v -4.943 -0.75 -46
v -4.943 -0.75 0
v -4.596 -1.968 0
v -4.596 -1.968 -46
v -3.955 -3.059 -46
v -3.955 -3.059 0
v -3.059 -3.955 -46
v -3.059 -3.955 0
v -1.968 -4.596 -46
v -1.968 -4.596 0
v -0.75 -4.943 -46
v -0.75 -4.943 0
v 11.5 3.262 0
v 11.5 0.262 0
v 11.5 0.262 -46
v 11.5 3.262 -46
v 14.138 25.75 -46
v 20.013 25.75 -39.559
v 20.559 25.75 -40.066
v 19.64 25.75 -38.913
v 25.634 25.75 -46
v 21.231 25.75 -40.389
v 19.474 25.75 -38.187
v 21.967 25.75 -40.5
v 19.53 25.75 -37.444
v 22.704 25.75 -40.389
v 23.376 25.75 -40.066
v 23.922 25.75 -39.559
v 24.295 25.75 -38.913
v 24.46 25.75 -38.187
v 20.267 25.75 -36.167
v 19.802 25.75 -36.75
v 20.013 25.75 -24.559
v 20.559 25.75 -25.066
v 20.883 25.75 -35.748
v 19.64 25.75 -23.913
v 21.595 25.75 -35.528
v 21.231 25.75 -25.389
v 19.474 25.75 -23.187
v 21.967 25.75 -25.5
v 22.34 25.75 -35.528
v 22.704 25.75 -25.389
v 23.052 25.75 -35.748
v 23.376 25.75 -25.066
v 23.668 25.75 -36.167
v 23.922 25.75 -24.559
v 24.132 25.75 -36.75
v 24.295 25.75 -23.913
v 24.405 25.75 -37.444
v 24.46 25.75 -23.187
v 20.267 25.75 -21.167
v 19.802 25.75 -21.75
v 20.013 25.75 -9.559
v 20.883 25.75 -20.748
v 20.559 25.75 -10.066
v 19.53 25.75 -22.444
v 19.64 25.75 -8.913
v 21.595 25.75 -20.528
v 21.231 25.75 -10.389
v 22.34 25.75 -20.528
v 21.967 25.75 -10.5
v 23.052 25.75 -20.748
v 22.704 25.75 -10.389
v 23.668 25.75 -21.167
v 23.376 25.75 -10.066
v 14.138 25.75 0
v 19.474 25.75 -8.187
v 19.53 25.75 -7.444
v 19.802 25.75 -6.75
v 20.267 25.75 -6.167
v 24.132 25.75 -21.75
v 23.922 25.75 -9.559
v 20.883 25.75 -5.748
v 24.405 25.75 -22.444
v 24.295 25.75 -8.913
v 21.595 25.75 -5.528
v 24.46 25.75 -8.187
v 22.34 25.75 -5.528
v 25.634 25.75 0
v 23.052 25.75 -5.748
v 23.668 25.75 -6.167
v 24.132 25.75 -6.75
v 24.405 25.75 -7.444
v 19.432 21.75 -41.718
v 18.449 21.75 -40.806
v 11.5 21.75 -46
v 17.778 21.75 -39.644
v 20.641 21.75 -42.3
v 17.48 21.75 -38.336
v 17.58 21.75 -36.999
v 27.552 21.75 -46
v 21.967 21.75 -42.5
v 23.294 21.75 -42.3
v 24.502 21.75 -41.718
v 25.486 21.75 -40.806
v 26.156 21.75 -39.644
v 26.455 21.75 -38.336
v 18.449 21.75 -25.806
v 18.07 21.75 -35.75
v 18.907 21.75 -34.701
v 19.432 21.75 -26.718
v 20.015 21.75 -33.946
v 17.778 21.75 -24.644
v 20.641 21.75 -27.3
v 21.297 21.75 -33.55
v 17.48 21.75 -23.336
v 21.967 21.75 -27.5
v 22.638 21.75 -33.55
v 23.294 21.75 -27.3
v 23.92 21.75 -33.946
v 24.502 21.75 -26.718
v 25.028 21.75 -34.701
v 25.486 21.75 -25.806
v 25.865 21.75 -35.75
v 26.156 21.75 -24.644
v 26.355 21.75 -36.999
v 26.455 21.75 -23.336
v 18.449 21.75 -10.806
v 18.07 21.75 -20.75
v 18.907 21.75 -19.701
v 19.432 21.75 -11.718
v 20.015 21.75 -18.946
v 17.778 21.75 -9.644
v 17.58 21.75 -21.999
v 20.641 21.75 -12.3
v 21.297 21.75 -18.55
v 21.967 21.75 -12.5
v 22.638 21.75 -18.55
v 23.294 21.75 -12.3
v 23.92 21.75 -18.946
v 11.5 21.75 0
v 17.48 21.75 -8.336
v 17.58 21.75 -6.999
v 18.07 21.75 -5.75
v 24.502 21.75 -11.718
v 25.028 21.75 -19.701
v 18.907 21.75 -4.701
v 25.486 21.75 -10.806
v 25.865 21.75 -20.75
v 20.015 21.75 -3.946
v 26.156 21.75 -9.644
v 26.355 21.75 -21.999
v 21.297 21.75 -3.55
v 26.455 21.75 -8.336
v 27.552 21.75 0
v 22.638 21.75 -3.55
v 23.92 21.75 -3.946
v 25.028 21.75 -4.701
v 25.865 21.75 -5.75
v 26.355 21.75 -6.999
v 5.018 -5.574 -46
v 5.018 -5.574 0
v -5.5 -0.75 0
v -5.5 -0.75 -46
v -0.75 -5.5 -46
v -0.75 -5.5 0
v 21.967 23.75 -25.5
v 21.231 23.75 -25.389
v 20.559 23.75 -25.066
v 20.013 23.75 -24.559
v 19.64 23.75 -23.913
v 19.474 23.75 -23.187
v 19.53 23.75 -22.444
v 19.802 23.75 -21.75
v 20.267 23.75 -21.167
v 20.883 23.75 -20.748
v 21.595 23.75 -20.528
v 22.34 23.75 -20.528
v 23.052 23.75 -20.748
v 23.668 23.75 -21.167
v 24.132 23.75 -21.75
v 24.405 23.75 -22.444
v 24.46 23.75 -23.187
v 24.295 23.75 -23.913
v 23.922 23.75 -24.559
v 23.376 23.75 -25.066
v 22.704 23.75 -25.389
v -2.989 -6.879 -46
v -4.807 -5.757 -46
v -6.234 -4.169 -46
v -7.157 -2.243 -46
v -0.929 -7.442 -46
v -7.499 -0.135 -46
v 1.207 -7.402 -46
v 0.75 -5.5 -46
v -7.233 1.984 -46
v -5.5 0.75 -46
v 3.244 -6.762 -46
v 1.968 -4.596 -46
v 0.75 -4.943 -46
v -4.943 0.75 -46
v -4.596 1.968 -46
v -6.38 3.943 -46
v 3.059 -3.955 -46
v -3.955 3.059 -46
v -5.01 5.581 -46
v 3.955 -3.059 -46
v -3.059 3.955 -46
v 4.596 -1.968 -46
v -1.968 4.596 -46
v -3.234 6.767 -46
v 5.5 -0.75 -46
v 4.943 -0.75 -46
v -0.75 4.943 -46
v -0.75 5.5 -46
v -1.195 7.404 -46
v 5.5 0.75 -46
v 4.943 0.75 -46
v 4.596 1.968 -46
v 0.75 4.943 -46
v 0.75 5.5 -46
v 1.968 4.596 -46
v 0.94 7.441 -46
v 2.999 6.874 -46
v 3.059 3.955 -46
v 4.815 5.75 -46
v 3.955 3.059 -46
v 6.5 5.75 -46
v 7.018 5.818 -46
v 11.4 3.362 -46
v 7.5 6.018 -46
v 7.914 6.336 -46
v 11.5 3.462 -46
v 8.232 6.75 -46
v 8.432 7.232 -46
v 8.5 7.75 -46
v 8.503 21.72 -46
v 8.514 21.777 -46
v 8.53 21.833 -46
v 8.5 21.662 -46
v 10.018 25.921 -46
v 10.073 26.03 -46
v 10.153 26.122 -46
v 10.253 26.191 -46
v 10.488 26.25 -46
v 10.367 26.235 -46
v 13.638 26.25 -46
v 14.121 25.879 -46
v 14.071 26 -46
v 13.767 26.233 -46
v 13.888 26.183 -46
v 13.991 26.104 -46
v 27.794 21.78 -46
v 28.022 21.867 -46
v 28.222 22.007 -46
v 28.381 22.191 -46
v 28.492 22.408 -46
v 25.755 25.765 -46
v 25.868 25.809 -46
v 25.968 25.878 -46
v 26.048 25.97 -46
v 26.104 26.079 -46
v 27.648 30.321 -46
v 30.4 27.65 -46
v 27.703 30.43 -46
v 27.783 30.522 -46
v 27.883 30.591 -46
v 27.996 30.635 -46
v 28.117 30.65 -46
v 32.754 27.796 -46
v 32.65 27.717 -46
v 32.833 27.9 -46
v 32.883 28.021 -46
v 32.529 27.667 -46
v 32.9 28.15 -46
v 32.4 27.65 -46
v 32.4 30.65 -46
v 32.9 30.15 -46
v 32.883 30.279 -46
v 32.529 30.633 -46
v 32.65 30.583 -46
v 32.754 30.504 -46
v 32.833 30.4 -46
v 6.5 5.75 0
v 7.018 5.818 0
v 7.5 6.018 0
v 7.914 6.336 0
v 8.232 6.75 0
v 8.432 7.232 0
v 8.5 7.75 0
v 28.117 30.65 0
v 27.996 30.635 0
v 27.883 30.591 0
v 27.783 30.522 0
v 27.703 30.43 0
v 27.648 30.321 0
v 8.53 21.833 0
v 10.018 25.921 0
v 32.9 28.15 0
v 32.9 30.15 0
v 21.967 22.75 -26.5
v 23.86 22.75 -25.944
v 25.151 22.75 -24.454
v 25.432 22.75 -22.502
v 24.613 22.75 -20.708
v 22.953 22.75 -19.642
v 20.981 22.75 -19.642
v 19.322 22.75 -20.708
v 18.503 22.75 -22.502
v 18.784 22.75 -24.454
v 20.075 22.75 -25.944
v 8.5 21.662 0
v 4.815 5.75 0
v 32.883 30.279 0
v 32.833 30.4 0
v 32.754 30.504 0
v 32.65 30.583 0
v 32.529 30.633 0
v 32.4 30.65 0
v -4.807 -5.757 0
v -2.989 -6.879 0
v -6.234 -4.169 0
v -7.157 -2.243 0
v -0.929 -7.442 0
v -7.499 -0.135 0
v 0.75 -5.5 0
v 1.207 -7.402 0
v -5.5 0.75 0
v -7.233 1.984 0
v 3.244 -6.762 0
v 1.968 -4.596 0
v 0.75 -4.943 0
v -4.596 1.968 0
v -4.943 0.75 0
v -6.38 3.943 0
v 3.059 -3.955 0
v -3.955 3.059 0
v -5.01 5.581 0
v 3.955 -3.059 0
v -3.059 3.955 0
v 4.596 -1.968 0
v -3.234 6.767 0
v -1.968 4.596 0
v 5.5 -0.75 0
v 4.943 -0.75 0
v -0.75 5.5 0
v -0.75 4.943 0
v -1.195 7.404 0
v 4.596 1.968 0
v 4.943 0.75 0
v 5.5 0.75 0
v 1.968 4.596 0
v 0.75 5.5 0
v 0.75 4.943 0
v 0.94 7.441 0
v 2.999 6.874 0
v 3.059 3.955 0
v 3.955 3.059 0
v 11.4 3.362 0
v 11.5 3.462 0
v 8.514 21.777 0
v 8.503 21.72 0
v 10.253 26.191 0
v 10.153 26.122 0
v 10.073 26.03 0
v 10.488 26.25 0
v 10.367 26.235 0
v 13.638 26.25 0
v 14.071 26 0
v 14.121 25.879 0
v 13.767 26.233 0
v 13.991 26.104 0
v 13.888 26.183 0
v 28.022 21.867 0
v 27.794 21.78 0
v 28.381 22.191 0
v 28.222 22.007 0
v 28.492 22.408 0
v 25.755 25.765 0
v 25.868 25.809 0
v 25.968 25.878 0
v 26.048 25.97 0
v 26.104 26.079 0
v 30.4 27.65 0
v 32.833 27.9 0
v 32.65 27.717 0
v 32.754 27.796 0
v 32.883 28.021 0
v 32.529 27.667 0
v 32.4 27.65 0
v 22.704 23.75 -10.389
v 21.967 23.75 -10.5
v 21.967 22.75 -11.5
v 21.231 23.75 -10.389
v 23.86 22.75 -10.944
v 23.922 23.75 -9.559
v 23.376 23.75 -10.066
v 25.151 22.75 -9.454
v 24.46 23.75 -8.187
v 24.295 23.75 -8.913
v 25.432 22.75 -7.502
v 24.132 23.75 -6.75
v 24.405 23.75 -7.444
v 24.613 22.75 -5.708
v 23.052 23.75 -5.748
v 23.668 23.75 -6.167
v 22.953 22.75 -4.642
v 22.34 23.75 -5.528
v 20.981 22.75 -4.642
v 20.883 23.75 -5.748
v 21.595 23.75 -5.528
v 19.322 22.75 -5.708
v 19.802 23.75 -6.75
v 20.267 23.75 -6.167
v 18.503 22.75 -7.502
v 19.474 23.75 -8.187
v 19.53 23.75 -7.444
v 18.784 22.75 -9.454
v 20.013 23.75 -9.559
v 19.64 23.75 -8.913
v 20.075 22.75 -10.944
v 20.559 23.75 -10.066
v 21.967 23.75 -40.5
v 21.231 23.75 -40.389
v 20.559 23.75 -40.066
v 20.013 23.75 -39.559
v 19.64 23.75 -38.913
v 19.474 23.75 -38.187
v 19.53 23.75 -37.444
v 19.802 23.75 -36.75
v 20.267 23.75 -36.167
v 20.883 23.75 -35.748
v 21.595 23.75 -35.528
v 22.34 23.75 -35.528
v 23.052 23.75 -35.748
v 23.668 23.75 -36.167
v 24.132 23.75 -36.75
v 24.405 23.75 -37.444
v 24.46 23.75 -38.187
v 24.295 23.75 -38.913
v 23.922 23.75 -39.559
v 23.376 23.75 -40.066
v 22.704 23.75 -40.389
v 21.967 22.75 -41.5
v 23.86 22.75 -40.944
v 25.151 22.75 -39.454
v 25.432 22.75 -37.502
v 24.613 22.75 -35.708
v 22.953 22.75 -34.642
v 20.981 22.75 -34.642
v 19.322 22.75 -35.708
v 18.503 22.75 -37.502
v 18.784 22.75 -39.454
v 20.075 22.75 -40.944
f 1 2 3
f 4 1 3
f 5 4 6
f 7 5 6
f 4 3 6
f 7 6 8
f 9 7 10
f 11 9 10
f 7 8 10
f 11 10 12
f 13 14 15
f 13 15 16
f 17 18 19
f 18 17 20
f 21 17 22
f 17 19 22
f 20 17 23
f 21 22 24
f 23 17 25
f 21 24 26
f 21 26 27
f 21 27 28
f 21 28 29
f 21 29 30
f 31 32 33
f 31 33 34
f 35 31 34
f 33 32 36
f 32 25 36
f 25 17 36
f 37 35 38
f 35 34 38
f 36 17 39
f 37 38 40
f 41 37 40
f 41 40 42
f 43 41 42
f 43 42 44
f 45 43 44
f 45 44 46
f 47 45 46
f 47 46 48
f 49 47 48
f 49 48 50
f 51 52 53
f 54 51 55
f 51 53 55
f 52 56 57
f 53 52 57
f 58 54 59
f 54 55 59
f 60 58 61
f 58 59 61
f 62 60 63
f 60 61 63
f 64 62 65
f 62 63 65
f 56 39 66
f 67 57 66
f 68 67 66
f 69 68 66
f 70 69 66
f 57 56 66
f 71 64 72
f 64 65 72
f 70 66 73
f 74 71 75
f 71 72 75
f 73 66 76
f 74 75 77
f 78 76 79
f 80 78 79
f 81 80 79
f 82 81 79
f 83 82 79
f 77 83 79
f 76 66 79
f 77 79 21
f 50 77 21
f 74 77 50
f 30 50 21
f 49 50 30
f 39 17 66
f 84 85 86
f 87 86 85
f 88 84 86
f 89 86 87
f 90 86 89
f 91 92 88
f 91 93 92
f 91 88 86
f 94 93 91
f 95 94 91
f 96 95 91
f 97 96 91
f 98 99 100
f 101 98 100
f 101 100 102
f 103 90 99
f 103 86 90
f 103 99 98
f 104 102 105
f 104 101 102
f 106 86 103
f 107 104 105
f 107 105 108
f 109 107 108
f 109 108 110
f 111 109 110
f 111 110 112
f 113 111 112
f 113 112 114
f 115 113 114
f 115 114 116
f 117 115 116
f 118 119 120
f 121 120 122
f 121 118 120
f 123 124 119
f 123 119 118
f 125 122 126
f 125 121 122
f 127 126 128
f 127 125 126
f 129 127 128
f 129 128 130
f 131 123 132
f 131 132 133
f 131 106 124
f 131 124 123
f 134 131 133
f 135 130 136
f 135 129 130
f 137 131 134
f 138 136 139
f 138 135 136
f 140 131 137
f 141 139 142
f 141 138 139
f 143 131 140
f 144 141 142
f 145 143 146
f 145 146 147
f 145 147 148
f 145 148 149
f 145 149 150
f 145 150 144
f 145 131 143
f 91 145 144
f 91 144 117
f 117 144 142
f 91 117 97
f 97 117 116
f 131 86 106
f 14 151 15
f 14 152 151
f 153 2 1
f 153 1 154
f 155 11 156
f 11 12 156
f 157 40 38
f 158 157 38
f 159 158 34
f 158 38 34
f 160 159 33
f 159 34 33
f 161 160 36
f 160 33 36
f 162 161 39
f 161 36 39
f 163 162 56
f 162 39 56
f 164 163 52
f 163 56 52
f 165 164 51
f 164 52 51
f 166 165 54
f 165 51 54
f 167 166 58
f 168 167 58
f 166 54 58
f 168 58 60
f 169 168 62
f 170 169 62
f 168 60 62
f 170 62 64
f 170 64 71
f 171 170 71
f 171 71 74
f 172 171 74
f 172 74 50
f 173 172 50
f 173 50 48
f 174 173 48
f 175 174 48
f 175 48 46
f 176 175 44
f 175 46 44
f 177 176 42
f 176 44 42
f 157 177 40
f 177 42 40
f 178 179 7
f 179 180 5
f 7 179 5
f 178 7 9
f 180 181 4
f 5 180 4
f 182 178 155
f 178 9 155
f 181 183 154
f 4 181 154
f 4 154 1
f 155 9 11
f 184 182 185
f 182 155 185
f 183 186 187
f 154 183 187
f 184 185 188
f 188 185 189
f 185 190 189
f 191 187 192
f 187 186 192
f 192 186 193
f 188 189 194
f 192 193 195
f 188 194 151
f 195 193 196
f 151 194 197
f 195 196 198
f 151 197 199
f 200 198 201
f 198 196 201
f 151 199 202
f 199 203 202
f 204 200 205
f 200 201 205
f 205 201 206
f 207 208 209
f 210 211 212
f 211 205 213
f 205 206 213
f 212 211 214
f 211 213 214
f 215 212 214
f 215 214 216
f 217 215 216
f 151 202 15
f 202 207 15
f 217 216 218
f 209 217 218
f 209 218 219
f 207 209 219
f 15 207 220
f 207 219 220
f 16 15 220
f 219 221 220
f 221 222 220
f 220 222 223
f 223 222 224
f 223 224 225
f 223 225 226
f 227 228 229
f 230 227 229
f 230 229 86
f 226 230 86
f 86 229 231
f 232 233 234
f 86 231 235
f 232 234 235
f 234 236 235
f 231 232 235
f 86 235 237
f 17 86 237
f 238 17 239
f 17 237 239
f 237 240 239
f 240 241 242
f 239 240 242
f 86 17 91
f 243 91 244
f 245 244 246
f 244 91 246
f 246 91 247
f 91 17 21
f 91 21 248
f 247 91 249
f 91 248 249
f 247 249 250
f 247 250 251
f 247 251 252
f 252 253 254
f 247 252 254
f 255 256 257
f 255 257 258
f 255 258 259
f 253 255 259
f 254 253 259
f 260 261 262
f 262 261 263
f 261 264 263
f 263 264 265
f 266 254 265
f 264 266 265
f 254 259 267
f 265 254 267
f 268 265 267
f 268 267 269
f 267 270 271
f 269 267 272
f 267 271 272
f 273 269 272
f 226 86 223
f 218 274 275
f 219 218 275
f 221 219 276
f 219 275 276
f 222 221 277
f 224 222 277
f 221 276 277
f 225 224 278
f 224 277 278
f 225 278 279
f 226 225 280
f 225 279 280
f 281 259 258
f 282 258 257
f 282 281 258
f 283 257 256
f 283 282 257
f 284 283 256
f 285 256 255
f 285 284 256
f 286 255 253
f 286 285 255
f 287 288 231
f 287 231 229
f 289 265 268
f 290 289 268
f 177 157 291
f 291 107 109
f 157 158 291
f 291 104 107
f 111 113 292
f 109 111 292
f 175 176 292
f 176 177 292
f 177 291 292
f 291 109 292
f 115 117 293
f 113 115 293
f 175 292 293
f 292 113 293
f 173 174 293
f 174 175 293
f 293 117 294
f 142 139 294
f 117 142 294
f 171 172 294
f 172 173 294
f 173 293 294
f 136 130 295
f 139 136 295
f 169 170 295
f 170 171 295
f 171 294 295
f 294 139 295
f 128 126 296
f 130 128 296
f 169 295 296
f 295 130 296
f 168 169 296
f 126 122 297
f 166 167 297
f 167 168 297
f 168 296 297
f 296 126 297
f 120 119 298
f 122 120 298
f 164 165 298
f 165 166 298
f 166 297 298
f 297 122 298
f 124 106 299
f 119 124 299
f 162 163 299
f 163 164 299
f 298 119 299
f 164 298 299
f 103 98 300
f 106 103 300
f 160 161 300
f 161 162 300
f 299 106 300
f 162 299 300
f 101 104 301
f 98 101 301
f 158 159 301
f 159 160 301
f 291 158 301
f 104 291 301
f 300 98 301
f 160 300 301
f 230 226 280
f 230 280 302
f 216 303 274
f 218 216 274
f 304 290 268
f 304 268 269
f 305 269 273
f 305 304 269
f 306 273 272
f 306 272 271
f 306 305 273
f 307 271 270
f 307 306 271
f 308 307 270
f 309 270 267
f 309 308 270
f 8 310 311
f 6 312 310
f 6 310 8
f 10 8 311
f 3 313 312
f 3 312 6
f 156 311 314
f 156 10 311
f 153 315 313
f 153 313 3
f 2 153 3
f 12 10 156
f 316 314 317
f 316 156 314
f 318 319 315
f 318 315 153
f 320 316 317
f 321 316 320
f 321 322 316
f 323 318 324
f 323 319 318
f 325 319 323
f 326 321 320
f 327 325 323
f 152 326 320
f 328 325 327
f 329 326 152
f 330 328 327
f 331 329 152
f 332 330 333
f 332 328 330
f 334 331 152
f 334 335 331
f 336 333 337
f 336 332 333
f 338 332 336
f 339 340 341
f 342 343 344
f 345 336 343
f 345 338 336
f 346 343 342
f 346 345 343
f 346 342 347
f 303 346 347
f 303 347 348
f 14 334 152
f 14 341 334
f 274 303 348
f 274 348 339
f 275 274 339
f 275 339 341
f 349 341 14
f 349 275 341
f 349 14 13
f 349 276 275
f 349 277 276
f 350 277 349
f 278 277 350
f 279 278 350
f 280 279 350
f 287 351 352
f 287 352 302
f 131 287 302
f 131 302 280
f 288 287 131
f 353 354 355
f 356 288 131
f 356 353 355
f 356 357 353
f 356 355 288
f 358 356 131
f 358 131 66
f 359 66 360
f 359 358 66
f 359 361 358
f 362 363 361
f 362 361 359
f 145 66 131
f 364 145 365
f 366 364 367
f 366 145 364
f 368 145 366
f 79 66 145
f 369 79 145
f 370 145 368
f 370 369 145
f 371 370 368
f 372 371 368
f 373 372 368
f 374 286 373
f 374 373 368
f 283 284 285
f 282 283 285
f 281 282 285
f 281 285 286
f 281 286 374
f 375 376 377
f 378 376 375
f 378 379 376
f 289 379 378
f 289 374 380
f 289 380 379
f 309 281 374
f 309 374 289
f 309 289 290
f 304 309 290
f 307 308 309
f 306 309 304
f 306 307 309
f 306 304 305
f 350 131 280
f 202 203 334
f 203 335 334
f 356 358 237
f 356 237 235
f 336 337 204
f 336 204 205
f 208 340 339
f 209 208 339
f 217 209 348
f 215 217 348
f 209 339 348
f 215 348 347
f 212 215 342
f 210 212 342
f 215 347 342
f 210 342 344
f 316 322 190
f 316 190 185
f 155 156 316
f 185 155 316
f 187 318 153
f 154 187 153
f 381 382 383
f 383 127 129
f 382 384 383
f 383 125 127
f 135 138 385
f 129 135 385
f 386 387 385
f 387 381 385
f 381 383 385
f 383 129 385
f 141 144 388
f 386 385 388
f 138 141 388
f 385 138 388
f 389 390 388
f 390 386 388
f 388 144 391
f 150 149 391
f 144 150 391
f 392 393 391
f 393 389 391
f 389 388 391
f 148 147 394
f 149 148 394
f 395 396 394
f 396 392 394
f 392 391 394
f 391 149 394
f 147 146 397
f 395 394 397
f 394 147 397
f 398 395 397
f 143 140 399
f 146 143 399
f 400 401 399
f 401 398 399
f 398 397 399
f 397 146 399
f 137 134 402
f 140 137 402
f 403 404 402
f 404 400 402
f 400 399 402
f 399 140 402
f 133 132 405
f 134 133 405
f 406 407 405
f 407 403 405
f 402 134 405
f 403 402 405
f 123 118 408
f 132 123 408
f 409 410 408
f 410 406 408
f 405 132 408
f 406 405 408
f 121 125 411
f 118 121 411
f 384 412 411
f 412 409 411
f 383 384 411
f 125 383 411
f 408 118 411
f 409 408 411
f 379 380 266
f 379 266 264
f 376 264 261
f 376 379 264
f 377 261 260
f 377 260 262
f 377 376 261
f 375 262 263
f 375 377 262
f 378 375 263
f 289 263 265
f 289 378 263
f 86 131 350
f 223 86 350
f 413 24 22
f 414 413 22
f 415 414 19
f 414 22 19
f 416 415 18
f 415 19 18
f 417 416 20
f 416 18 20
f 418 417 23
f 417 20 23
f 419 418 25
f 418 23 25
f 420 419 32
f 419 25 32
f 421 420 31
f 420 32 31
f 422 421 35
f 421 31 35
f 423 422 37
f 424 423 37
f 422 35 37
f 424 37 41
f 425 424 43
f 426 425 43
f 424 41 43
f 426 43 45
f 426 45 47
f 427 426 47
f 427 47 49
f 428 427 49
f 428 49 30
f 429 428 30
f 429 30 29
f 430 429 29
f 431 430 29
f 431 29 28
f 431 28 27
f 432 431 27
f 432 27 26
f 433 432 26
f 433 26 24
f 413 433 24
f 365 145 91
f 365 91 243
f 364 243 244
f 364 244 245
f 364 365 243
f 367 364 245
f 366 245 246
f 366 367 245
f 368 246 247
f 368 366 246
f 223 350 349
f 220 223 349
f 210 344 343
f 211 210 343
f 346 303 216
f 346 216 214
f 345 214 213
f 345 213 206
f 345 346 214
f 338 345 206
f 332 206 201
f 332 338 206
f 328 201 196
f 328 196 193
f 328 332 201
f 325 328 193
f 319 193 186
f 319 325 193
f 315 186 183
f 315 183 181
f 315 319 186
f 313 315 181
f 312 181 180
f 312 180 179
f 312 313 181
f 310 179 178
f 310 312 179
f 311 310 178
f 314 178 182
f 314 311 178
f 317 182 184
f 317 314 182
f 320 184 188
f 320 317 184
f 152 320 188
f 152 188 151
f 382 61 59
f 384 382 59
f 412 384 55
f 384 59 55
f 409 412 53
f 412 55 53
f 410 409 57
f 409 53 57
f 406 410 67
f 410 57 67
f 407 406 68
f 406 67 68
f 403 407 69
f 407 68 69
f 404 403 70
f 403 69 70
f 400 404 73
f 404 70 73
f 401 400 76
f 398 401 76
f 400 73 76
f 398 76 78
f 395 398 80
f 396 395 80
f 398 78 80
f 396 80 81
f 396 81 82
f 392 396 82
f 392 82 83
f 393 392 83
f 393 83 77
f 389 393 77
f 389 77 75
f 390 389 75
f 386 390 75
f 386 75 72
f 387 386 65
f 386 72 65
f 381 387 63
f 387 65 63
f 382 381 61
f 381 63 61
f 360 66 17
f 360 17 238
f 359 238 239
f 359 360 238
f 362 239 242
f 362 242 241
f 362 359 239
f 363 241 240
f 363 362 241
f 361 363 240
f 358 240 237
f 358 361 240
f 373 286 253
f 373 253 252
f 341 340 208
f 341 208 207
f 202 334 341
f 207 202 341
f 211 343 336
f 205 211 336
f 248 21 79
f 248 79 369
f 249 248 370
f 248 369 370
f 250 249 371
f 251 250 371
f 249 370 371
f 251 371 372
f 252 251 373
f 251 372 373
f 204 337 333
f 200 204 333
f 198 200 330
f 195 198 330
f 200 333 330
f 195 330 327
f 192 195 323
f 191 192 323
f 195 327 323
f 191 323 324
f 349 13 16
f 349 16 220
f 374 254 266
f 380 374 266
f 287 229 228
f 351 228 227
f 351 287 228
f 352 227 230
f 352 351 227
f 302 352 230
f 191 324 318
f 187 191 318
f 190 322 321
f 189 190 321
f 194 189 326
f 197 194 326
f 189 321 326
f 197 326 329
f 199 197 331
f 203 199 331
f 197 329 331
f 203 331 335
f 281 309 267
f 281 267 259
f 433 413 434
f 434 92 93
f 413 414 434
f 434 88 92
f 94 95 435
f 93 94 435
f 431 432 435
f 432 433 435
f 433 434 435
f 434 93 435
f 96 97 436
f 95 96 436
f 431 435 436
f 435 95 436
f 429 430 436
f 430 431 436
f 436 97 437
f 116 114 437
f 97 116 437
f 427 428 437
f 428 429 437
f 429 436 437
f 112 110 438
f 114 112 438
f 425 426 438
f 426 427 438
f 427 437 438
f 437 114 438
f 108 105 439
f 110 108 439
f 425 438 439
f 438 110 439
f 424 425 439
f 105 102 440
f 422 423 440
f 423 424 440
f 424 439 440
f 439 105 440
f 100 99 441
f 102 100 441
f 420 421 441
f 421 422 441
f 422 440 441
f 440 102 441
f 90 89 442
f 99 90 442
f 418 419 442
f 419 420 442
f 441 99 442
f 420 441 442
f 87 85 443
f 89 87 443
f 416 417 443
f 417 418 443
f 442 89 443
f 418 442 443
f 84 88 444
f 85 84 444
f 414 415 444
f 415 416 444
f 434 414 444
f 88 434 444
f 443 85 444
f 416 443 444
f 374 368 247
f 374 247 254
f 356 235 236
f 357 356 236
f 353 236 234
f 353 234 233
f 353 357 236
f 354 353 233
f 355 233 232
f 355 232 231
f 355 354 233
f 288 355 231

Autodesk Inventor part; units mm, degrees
ref_plane "YZ Plane" through (0, 0, 0) normal (1, 0, 0) x (0, 1, 0)
ref_plane "XZ Plane" through (0, 0, 0) normal (0, 1, 0) x (-1, 0, 0)
ref_plane "XY Plane" through (0, 0, 0) normal (0, 0, 1) x (1, 0, 0)
sketch "Boceto1" plane through (0, 0, 0) normal (0, 0, 1) x (1, 0, 0)
  arc A0 (4.8153, 5.75) -> (5.0185, -5.5736) centre (0, 0) ccw
  line L0 (0, 12.1119) -> (0, -11.4197) construction
  line L1 (-11.1817, 0) -> (12.1806, 0) construction
  line L2 (4.9434, 0.75) -> (5.5, 0.75)
  line L3 (4.9434, -0.75) -> (5.5, -0.75)
  line L4 (5.5, -0.75) -> (5.5, 0.75)
  line L5 (-0.75, 4.9434) -> (-0.75, 5.5)
  line L6 (0.75, 5.5) -> (-0.75, 5.5)
  line L7 (0.75, 4.9434) -> (0.75, 5.5)
  line L8 (-4.9434, -0.75) -> (-5.5, -0.75)
  line L9 (-5.5, 0.75) -> (-5.5, -0.75)
  line L10 (-4.9434, 0.75) -> (-5.5, 0.75)
  line L11 (0.75, -4.9434) -> (0.75, -5.5)
  line L12 (-0.75, -5.5) -> (0.75, -5.5)
  line L13 (-0.75, -4.9434) -> (-0.75, -5.5)
  arc A1 (-0.75, 4.9434) -> (-4.9434, 0.75) centre (0, 0) ccw
  arc A2 (-4.9434, -0.75) -> (-0.75, -4.9434) centre (0, 0) ccw
  arc A3 (0.75, -4.9434) -> (4.9434, -0.75) centre (0, 0) ccw
  arc A4 (4.9434, 0.75) -> (0.75, 4.9434) centre (0, 0) ccw
  circle A5 centre (0, 0) radius 5 construction
  line L14 (-11.772, 7.5) -> (14.517, 7.5) construction
  line L15 (-11.772, -7.5) -> (14.517, -7.5) construction
  line L16 (4.8153, 5.75) -> (6.5, 5.75)
  line L17 (8.5, 7.75) -> (8.5, 21.6618)
  line L18 (14.1379, 25.75) -> (25.6337, 25.75)
  line L19 (11.5, 21.75) -> (11.5, 3.4624)
  arc A6 (6.5, 5.75) -> (8.5, 7.75) centre (6.5, 7.75) ccw
  line L20 (5.0185, -5.5736) -> (11.5, 0.2624)
  line L21 (11.5, 21.75) -> (27.5524, 21.75)
  line L22 (28.4921, 22.408) -> (30.4, 27.65)
  line L23 (30.4, 27.65) -> (32.4, 27.65)
  line L24 (32.9, 28.15) -> (32.9, 30.15)
  line L25 (32.4, 30.65) -> (28.1174, 30.65)
  line L26 (27.6475, 30.321) -> (26.1036, 26.079)
  line L27 (14.1379, 25.75) -> (14.1379, 25.75)
  line L28 (13.6379, 26.25) -> (10.488, 26.25)
  line L29 (10.0181, 25.921) -> (8.5302, 21.8328)
  line L30 (11.5, 0.2624) -> (11.5, 3.2624)
  line L31 (12.5556, 3.3624) -> (11.7894, 3.3624) construction
  line L32 (11.5, 3.4624) -> (11.4, 3.3624)
  line L33 (11.5, 3.2624) -> (11.4, 3.3624)
  arc A7 (32.4, 27.65) -> (32.9, 28.15) centre (32.4, 28.15) ccw
  arc A8 (32.9, 30.15) -> (32.4, 30.65) centre (32.4, 30.15) ccw
  arc A9 (28.1174, 30.65) -> (27.6475, 30.321) centre (28.1174, 30.15) ccw
  arc A10 (14.1379, 25.75) -> (13.6379, 26.25) centre (13.6379, 25.75) ccw
  arc A11 (10.488, 26.25) -> (10.0181, 25.921) centre (10.488, 25.75) ccw
  arc A12 (25.6337, 25.75) -> (26.1036, 26.079) centre (25.6337, 26.25) ccw
  arc A13 (27.5524, 21.75) -> (28.4921, 22.408) centre (27.5524, 22.75) ccw
  arc A14 (8.5302, 21.8328) -> (8.5, 21.6618) centre (9, 21.6618) ccw
  point P0 (25.9838, 25.75)
  point P1 (8.5, 21.75)
  point P2 (28.2526, 21.75)
  point P3 (32.9, 27.65)
  point P4 (32.9, 30.65)
  point P5 (27.7673, 30.65)
  point P6 (14.1379, 26.25)
  point P7 (10.1379, 26.25)
  dimension "d0" = 15
  dimension "d4" = 0.75
  dimension "d6" = 1.5
  dimension "d11" = 360
  dimension "d13" = 10
  dimension "d14" = 0.5
  dimension "d15" = 5
  dimension "d16" = 1.75
  dimension "d22" = 3
  dimension "d27" = 20
  dimension "d49" = 2
  dimension "d89" = 4
  dimension "d90" = 3
  dimension "d91" = 3.5
  dimension "d92" = 4
  dimension "d93" = 0.5
  dimension "d96" = 2.5
  dimension "d97" = 4.5
  dimension "d98" = 3
  dimension "d100" = 48
  dimension "d101" = 0.2
  dimension "d102" = 0.1
  dimension "d106" = 0.1
  dimension "d108" = 70
  dimension "d111" = 24.4
  dimension "d113" = 19
  dimension "d118" = 70
  dimension "d123" = 0.5
  dimension "d124" = 1
  dimension "d125" = 0.5
  dimension "d155" = 8.9
  dimension "d156" = 38.15
extrude "Extrusión1" add sketch "Boceto1" against normal blind 46
sketch "Boceto2" plane through (11.5, 21.75, 0) normal (0, -1, 0) x (1, 0, 0)
  line L0 (10.4674, 0.9421) -> (10.4674, -47.0057) construction
  line L1 (16.0524, 0) -> (16.0524, -46) projected
  line L2 (0, 0) -> (0, -46) projected
  line L3 (-0.8036, -23) -> (23.8698, -23) construction
  line L4 (0, 0) -> (16.0524, 0) projected
  line L5 (16.0524, -46) -> (0, -46) projected
  circle A0 centre (10.4674, -23) radius 2.5
  circle A1 centre (10.4674, -23) radius 4.5
  circle A2 centre (10.4674, -38) radius 2.5
  circle A3 centre (10.4674, -38) radius 4.5
  circle A4 centre (10.4674, -8) radius 2.5
  circle A5 centre (10.4674, -8) radius 4.5
  point P0 (-11.5, 0)
  dimension "d134" = 5.585
  dimension "d136" = 23
  dimension "d137" = 23
  dimension "d138" = 5
  dimension "d139" = 9
  dimension "d140" = 2
  dimension "d143" = 15
hole "Agujero2" at (21.9674, 21.75, -8) at (21.9674, 21.75, -23) at (21.9674, 21.75, -38) direction (0, 1, 0) diameter 5 end through all countersink diameter 9 countersink angle 90
properties part number "HIN-61 BISAGRA (P2)" material "Aluminio"
